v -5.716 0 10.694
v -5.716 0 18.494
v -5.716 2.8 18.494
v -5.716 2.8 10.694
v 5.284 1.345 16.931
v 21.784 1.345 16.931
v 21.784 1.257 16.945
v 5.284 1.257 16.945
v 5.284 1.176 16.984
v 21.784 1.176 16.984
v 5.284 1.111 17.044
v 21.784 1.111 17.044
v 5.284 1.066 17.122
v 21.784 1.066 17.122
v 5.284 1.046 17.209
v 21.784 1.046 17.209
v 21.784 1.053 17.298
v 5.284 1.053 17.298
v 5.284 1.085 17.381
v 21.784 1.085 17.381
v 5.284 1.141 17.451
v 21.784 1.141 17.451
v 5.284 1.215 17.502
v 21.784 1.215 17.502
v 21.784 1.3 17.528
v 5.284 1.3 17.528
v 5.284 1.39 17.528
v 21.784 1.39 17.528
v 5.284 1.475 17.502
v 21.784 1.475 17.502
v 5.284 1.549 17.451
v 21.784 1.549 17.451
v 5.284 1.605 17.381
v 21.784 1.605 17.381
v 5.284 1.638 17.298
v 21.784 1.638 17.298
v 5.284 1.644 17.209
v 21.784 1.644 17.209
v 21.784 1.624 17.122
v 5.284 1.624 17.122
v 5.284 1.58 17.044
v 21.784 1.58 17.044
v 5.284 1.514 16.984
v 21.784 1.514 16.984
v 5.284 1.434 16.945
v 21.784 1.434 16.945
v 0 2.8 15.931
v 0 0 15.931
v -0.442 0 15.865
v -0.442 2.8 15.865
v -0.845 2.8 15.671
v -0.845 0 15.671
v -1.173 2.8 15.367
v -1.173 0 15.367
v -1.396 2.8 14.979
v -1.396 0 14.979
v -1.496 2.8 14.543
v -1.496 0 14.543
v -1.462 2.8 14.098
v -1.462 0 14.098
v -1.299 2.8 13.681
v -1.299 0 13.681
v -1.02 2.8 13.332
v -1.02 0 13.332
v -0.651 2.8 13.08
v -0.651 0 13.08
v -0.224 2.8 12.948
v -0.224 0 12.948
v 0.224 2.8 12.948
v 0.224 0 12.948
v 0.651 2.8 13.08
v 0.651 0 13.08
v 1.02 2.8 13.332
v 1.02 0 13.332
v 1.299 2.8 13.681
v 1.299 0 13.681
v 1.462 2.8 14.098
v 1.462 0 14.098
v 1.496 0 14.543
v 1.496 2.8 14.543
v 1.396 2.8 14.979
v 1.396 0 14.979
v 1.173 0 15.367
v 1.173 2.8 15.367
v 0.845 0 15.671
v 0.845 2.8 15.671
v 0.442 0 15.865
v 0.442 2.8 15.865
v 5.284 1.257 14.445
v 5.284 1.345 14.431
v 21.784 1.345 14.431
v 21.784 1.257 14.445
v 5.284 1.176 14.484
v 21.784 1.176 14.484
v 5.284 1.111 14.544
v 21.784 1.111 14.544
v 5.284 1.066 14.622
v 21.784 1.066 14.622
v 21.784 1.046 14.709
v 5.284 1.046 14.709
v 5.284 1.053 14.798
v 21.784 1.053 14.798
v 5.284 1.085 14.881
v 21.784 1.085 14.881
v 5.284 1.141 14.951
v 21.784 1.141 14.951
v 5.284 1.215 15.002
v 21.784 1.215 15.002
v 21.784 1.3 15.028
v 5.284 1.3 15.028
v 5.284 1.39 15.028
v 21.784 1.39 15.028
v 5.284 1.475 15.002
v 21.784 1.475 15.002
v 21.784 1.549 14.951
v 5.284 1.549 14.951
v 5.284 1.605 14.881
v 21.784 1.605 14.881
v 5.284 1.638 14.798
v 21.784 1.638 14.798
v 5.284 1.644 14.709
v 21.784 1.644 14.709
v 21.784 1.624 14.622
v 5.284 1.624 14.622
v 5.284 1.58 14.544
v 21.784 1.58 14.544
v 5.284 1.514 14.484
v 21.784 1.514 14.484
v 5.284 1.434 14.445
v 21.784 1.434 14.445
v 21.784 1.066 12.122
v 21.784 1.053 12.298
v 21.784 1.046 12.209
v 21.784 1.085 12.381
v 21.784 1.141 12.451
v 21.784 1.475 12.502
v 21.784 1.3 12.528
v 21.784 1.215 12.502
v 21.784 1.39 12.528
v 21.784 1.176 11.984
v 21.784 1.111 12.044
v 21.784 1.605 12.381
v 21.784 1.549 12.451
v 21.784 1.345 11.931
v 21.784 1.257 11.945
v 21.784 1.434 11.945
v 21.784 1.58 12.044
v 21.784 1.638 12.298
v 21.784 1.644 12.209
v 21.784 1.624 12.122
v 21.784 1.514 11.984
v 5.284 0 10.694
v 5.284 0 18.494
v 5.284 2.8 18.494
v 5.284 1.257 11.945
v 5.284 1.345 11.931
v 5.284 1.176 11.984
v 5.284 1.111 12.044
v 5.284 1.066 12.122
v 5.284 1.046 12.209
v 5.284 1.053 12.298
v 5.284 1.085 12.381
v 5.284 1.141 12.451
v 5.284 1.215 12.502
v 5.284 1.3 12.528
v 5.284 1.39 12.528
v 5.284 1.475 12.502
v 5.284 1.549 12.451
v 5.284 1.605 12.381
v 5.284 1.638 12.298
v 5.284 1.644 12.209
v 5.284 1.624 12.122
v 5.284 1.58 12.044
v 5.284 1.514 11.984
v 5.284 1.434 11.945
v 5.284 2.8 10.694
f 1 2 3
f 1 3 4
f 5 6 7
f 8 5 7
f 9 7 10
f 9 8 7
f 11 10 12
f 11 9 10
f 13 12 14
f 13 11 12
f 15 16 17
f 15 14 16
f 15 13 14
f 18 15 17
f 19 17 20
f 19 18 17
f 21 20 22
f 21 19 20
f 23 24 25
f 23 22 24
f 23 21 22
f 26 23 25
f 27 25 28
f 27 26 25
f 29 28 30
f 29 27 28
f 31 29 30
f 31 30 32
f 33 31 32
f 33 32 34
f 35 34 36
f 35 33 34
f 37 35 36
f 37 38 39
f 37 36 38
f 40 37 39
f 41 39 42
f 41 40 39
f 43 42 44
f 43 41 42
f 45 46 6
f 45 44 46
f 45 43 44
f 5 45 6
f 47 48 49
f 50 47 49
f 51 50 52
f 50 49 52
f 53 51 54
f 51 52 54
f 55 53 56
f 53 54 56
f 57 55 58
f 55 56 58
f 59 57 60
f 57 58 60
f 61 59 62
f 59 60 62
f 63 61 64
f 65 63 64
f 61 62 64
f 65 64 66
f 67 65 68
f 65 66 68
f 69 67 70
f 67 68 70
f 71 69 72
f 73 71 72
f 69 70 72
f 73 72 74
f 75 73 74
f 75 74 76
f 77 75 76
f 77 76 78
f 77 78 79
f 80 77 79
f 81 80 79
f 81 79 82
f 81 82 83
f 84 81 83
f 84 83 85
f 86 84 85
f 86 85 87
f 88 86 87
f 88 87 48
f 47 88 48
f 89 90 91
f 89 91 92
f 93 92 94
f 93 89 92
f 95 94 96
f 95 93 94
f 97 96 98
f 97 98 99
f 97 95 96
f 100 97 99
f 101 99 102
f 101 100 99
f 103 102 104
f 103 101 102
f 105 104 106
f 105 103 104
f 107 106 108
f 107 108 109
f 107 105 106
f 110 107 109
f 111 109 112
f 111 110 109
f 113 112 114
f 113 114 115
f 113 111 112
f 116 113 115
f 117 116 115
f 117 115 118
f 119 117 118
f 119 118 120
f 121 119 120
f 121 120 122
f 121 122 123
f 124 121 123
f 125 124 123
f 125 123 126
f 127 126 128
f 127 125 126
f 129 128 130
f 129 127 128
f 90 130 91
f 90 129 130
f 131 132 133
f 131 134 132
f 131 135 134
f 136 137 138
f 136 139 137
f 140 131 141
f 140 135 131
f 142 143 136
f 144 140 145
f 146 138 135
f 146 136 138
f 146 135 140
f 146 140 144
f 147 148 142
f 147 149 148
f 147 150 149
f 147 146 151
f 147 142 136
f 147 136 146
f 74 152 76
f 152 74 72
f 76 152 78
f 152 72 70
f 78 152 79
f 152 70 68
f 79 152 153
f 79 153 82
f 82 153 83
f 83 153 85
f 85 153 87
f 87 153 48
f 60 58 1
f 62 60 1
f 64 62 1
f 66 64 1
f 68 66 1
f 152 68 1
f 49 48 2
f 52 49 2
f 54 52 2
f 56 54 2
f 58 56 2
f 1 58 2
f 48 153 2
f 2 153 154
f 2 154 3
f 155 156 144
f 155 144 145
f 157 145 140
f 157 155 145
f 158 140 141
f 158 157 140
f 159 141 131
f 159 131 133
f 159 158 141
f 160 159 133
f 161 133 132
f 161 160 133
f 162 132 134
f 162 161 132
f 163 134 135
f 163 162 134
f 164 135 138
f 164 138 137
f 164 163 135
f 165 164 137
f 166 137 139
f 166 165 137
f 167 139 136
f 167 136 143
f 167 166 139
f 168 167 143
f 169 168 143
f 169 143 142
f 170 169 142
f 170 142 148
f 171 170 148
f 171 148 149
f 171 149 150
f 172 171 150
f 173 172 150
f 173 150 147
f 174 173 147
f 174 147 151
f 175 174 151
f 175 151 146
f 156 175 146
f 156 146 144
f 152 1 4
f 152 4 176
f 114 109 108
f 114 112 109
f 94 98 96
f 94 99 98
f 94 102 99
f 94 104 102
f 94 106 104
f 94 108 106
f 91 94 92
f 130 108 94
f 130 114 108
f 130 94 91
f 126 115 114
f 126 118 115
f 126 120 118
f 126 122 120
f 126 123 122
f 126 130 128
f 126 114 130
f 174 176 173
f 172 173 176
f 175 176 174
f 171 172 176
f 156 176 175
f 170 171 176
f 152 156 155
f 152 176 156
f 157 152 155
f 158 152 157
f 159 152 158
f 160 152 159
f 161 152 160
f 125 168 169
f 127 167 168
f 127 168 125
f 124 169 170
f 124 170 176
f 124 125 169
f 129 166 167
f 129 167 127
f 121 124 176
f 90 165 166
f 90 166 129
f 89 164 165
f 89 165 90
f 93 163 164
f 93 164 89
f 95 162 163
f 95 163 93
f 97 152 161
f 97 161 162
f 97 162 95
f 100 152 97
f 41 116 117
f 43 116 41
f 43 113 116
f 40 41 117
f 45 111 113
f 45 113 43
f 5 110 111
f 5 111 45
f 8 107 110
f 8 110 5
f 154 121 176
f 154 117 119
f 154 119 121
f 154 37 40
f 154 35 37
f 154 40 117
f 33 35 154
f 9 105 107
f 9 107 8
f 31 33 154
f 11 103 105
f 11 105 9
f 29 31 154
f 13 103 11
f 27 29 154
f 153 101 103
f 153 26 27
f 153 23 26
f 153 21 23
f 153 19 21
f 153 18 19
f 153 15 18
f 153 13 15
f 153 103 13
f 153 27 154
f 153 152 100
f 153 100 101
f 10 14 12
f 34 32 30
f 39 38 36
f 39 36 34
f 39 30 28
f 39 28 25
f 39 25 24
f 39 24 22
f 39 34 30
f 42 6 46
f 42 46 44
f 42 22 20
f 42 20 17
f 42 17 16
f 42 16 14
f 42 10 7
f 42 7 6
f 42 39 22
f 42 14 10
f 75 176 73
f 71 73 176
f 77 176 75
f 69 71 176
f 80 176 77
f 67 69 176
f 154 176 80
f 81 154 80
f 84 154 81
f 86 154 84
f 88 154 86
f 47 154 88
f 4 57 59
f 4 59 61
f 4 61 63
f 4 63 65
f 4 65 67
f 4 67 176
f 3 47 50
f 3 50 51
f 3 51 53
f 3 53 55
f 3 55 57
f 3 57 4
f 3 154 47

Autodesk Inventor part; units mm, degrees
ref_plane "YZ Plane" through (0, 0, 0) normal (1, 0, 0) x (0, 1, 0)
ref_plane "XZ Plane" through (0, 0, 0) normal (0, 1, 0) x (-1, 0, 0)
ref_plane "XY Plane" through (0, 0, 0) normal (0, 0, 1) x (1, 0, 0)
sketch "Sketch1" plane through (0, 0, 0) normal (0, 1, 0) x (-1, 0, 0)
  line L0 (5.7156, 18.4944) -> (5.7156, 10.6944)
  line L1 (5.7156, 10.6944) -> (-5.2844, 10.6944)
  line L2 (-5.2844, 10.6944) -> (-5.2844, 18.4944)
  line L3 (-5.2844, 18.4944) -> (5.7156, 18.4944)
  point P0 (0, 0)
  dimension "d3" = 7.8
  dimension "d4" = 11
  dimension "d5" = 7.8
  dimension "d6" = 11
extrude "Extrusion1" add sketch "Sketch1" along normal blind 2.8
sketch "Sketch2" plane through (5.2844, 0, 18.4944) normal (1, 0, 0) x (0, 0, -1)
  circle A0 centre (1.263, 1.3452) radius 0.3
  point P0 (18.4944, 0)
  dimension "d10" = 0.6
extrude "Extrusion2" add sketch "Sketch2" along normal blind 16.5
sketch "Sketch3" plane through (5.2844, 0, 18.4944) normal (1, 0, 0) x (0, 0, -1)
  circle A0 centre (1.263, 1.3452) radius 0.3 projected
  line L0 (1.263, 1.3452) -> (3.763, 1.3452)
  circle A1 centre (3.763, 1.3452) radius 0.3
  point P0 (18.4944, 0)
  dimension "d13" = 2.5
  dimension "d14" = 0.6
extrude "Extrusion3" add sketch "Sketch3" along normal blind 16.5 contours A1
sketch "Sketch4" plane through (5.2844, 0, 18.4944) normal (1, 0, 0) x (0, 0, -1)
  circle A0 centre (3.763, 1.3452) radius 0.3 projected
  line L0 (3.763, 1.3452) -> (6.263, 1.3452)
  circle A1 centre (6.263, 1.3452) radius 0.3
  point P0 (18.4944, 0)
  dimension "d17" = 2.5
  dimension "d18" = 0.6
extrude "Extrusion4" add sketch "Sketch4" along normal blind 16.5 contours A1
sketch "Sketch6" plane through (0, 2.8, 0) normal (0, 1, 0) x (1, 0, 0)
  circle A0 centre (0, -14.4314) radius 1.5 projected
  point P0 (0, 0)
hole "Hole1" at (0, 2.8, 14.4314) direction (0, -1, 0) diameter 3 end through all
properties part number "Transistor" material "Copper, Alloy"
